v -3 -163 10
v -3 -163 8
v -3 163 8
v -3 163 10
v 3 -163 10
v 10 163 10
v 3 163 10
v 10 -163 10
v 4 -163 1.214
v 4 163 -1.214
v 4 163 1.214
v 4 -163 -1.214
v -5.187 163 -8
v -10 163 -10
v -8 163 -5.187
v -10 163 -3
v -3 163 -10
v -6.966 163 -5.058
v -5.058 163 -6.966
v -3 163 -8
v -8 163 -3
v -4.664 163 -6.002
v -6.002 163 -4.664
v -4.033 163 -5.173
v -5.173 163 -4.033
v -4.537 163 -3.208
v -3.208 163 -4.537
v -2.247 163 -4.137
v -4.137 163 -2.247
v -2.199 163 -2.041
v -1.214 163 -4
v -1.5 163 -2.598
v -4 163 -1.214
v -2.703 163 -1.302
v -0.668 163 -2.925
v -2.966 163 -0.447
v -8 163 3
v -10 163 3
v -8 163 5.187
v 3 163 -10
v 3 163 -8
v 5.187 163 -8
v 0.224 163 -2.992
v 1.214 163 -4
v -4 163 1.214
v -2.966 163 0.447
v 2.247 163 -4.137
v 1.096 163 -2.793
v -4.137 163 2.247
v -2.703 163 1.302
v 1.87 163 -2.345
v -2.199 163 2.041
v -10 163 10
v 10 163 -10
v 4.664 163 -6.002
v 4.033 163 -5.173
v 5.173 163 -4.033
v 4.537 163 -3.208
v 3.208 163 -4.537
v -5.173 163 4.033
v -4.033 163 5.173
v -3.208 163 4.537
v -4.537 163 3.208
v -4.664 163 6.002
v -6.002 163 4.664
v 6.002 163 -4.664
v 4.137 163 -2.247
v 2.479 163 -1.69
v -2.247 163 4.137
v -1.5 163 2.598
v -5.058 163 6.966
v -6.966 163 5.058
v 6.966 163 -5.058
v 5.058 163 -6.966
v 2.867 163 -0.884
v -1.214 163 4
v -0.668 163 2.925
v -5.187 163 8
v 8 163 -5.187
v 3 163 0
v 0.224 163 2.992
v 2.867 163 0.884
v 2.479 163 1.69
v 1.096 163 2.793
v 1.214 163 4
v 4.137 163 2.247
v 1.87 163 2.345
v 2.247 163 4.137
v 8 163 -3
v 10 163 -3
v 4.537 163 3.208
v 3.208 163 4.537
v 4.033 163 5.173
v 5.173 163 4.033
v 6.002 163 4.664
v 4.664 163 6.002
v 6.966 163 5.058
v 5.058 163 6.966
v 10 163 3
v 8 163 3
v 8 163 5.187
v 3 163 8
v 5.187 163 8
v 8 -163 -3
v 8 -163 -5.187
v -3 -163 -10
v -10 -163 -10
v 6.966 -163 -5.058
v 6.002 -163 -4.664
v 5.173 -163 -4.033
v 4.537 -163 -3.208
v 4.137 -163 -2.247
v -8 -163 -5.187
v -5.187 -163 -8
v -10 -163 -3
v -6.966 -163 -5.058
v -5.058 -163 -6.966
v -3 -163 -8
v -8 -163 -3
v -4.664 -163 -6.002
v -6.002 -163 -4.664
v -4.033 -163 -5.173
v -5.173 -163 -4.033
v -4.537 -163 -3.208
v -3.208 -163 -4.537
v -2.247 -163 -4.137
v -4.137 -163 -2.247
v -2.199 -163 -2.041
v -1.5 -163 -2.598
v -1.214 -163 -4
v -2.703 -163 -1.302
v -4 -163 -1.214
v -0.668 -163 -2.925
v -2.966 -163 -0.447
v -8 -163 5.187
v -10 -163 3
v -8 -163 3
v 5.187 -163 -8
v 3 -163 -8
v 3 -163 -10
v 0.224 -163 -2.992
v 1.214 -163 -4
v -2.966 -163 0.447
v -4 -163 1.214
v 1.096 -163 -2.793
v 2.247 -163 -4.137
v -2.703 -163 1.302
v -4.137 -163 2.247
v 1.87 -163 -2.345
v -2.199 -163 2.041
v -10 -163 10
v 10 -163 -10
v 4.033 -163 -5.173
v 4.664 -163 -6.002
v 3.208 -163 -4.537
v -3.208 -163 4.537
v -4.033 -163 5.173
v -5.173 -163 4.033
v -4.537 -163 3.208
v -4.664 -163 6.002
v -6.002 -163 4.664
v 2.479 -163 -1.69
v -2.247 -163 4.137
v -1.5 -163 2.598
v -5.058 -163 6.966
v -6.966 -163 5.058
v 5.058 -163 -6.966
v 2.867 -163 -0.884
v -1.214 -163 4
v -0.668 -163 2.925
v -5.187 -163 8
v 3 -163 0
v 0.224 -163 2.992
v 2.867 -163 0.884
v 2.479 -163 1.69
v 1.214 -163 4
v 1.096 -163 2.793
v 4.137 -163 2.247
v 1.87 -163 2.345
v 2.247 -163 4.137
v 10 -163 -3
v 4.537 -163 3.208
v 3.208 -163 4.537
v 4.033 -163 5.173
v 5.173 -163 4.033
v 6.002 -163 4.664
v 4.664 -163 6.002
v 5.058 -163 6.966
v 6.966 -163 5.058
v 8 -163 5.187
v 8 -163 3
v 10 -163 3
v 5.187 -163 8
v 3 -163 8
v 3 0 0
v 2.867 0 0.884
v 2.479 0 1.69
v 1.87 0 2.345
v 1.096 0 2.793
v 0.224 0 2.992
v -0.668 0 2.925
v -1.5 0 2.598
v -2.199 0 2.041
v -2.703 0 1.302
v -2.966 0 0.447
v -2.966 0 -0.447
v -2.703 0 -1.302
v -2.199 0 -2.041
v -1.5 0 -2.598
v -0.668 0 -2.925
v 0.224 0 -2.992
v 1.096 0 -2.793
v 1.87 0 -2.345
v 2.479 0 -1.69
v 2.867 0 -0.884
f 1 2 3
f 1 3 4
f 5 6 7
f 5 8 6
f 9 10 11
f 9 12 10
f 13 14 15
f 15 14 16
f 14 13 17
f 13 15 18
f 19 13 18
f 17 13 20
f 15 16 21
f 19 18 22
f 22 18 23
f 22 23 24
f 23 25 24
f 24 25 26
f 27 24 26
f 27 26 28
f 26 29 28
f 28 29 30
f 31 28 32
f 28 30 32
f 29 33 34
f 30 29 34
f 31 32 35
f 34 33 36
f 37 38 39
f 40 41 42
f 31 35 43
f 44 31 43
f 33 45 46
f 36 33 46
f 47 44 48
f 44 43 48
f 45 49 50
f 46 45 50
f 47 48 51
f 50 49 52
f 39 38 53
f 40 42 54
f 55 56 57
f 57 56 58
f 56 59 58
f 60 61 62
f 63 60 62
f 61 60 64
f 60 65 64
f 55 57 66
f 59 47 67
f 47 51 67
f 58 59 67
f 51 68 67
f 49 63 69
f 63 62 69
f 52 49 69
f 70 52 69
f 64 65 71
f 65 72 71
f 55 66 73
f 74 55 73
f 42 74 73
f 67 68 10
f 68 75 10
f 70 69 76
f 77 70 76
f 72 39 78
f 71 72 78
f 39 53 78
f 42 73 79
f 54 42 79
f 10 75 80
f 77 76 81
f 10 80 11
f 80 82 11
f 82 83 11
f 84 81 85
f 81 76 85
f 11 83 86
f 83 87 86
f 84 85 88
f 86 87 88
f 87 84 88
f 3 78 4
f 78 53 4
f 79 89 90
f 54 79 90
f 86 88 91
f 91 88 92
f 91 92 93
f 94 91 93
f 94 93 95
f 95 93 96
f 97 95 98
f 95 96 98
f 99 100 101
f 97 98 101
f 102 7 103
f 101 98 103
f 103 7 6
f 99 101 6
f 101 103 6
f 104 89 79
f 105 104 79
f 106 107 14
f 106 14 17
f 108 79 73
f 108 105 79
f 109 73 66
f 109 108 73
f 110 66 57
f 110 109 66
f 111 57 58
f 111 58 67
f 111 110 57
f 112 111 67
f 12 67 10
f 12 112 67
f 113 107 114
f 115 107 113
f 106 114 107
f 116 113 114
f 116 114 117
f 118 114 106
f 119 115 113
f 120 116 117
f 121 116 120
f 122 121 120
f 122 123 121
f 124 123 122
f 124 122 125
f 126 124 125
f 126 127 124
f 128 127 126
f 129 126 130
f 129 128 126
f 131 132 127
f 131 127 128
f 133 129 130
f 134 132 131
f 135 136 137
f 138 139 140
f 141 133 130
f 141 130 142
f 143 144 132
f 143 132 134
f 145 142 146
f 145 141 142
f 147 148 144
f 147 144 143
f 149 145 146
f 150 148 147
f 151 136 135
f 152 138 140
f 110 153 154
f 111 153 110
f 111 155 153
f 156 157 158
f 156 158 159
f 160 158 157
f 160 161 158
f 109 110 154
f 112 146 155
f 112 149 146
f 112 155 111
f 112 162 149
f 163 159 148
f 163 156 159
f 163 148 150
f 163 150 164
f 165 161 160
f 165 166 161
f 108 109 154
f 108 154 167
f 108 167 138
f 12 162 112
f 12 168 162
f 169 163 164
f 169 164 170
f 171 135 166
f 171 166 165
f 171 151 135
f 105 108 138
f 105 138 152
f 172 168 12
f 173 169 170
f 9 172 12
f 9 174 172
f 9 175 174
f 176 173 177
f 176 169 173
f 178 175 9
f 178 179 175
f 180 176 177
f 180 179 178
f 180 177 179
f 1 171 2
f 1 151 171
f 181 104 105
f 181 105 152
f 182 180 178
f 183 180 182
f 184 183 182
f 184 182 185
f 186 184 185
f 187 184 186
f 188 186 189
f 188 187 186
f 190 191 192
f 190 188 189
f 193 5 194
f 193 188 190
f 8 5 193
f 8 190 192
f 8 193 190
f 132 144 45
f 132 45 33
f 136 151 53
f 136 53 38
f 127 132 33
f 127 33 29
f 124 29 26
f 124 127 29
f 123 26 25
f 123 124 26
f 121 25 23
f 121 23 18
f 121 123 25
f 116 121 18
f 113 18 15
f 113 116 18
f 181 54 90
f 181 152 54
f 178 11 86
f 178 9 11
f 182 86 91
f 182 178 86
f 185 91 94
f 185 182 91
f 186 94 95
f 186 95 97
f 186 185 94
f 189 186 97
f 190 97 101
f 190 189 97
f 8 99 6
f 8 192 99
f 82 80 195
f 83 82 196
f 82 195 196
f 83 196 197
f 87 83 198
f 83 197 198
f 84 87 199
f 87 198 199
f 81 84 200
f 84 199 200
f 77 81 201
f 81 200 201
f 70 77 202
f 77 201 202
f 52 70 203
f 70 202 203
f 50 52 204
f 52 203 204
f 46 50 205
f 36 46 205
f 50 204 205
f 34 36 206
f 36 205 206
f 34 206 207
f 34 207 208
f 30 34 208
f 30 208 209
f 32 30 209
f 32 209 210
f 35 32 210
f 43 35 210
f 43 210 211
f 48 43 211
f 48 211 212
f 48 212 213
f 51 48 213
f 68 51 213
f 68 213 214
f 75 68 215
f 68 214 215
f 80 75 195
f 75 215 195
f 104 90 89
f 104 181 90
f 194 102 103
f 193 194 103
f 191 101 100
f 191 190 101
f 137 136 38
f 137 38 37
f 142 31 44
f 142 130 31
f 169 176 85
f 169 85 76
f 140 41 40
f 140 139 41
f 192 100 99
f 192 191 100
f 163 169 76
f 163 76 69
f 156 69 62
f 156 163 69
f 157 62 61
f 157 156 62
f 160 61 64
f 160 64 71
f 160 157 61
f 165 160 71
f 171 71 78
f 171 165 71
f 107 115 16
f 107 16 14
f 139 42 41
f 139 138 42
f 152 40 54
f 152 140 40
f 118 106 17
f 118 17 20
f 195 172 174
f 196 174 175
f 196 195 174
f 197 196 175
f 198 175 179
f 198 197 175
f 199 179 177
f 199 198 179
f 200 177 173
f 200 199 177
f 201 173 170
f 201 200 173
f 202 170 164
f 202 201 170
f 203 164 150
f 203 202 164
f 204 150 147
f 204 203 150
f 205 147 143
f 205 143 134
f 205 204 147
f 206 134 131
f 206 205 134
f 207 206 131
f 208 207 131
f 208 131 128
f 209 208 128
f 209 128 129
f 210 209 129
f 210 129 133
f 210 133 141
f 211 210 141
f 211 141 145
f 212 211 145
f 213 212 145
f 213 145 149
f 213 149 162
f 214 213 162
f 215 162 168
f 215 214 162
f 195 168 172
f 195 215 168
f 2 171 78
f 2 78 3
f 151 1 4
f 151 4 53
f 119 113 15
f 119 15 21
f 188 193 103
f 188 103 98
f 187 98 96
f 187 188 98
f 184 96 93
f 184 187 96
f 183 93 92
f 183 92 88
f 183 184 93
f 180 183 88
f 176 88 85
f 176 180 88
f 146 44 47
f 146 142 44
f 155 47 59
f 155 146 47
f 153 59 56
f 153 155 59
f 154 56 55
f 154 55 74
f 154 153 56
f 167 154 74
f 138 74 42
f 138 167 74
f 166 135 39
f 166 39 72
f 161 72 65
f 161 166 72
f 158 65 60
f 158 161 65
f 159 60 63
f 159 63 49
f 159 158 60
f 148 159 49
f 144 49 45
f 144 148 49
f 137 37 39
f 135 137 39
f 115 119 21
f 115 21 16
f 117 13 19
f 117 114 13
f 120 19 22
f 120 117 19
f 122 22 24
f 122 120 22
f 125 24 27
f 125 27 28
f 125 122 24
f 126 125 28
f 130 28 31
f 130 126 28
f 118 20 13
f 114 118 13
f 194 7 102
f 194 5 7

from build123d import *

# Parameters (mm, degrees)
F0_R          = 3
F1_DEPTH      = 163
F1_DEPTH_BACK = 163


with BuildPart() as f1:
    # F0 (on Front) → F1 (new body, two sides)
    with BuildSketch(Plane.XZ) as f1_sk:
        with BuildLine():
            Line((3, 10), (3, 8))
            Line((3, 8), (5.187252, 8))
            ThreePointArc((5.187252, 8), (4.033043, 5.173211), (1.214087, 4))
            Line((1.214087, 4), (0, 4))
            Line((0, 4), (-1.214087, 4))
            ThreePointArc((-1.214087, 4), (-4.033043, 5.173211), (-5.187252, 8))
            Line((-5.187252, 8), (-3, 8))
            Line((-3, 8), (-3, 10))
            Line((-3, 10), (-10, 10))
            Line((-10, 10), (-10, 3))
            Line((-10, 3), (-8, 3))
            Line((-8, 3), (-8, 5.187252))
            ThreePointArc((-8, 5.187252), (-5.173211, 4.033043), (-4, 1.214087))
            Line((-4, 1.214087), (-4, 0))
            Line((-4, 0), (-4, -1.214087))
            ThreePointArc((-4, -1.214087), (-5.173211, -4.033043), (-8, -5.187252))
            Line((-8, -5.187252), (-8, -3))
            Line((-8, -3), (-10, -3))
            Line((-10, -3), (-10, -10))
            Line((-10, -10), (-3, -10))
            Line((-3, -10), (-3, -8))
            Line((-3, -8), (-5.187252, -8))
            ThreePointArc((-5.187252, -8), (-4.033043, -5.173211), (-1.214087, -4))
            Line((-1.214087, -4), (0, -4))
            Line((0, -4), (1.214087, -4))
            ThreePointArc((1.214087, -4), (4.033043, -5.173211), (5.187252, -8))
            Line((5.187252, -8), (3, -8))
            Line((3, -8), (3, -10))
            Line((3, -10), (10, -10))
            Line((10, -10), (10, -3))
            Line((10, -3), (8, -3))
            Line((8, -3), (8, -5.187252))
            ThreePointArc((8, -5.187252), (5.173211, -4.033043), (4, -1.214087))
            Line((4, -1.214087), (4, 0))
            Line((4, 0), (4, 1.214087))
            ThreePointArc((4, 1.214087), (5.173211, 4.033043), (8, 5.187252))
            Line((8, 5.187252), (8, 3))
            Line((8, 3), (10, 3))
            Line((10, 3), (10, 10))
            Line((10, 10), (3, 10))
        make_face()
        Circle(F0_R, mode=Mode.SUBTRACT)
    extrude(amount=F1_DEPTH)
    extrude(f1_sk.sketch, amount=-F1_DEPTH_BACK)


solid = f1.part
